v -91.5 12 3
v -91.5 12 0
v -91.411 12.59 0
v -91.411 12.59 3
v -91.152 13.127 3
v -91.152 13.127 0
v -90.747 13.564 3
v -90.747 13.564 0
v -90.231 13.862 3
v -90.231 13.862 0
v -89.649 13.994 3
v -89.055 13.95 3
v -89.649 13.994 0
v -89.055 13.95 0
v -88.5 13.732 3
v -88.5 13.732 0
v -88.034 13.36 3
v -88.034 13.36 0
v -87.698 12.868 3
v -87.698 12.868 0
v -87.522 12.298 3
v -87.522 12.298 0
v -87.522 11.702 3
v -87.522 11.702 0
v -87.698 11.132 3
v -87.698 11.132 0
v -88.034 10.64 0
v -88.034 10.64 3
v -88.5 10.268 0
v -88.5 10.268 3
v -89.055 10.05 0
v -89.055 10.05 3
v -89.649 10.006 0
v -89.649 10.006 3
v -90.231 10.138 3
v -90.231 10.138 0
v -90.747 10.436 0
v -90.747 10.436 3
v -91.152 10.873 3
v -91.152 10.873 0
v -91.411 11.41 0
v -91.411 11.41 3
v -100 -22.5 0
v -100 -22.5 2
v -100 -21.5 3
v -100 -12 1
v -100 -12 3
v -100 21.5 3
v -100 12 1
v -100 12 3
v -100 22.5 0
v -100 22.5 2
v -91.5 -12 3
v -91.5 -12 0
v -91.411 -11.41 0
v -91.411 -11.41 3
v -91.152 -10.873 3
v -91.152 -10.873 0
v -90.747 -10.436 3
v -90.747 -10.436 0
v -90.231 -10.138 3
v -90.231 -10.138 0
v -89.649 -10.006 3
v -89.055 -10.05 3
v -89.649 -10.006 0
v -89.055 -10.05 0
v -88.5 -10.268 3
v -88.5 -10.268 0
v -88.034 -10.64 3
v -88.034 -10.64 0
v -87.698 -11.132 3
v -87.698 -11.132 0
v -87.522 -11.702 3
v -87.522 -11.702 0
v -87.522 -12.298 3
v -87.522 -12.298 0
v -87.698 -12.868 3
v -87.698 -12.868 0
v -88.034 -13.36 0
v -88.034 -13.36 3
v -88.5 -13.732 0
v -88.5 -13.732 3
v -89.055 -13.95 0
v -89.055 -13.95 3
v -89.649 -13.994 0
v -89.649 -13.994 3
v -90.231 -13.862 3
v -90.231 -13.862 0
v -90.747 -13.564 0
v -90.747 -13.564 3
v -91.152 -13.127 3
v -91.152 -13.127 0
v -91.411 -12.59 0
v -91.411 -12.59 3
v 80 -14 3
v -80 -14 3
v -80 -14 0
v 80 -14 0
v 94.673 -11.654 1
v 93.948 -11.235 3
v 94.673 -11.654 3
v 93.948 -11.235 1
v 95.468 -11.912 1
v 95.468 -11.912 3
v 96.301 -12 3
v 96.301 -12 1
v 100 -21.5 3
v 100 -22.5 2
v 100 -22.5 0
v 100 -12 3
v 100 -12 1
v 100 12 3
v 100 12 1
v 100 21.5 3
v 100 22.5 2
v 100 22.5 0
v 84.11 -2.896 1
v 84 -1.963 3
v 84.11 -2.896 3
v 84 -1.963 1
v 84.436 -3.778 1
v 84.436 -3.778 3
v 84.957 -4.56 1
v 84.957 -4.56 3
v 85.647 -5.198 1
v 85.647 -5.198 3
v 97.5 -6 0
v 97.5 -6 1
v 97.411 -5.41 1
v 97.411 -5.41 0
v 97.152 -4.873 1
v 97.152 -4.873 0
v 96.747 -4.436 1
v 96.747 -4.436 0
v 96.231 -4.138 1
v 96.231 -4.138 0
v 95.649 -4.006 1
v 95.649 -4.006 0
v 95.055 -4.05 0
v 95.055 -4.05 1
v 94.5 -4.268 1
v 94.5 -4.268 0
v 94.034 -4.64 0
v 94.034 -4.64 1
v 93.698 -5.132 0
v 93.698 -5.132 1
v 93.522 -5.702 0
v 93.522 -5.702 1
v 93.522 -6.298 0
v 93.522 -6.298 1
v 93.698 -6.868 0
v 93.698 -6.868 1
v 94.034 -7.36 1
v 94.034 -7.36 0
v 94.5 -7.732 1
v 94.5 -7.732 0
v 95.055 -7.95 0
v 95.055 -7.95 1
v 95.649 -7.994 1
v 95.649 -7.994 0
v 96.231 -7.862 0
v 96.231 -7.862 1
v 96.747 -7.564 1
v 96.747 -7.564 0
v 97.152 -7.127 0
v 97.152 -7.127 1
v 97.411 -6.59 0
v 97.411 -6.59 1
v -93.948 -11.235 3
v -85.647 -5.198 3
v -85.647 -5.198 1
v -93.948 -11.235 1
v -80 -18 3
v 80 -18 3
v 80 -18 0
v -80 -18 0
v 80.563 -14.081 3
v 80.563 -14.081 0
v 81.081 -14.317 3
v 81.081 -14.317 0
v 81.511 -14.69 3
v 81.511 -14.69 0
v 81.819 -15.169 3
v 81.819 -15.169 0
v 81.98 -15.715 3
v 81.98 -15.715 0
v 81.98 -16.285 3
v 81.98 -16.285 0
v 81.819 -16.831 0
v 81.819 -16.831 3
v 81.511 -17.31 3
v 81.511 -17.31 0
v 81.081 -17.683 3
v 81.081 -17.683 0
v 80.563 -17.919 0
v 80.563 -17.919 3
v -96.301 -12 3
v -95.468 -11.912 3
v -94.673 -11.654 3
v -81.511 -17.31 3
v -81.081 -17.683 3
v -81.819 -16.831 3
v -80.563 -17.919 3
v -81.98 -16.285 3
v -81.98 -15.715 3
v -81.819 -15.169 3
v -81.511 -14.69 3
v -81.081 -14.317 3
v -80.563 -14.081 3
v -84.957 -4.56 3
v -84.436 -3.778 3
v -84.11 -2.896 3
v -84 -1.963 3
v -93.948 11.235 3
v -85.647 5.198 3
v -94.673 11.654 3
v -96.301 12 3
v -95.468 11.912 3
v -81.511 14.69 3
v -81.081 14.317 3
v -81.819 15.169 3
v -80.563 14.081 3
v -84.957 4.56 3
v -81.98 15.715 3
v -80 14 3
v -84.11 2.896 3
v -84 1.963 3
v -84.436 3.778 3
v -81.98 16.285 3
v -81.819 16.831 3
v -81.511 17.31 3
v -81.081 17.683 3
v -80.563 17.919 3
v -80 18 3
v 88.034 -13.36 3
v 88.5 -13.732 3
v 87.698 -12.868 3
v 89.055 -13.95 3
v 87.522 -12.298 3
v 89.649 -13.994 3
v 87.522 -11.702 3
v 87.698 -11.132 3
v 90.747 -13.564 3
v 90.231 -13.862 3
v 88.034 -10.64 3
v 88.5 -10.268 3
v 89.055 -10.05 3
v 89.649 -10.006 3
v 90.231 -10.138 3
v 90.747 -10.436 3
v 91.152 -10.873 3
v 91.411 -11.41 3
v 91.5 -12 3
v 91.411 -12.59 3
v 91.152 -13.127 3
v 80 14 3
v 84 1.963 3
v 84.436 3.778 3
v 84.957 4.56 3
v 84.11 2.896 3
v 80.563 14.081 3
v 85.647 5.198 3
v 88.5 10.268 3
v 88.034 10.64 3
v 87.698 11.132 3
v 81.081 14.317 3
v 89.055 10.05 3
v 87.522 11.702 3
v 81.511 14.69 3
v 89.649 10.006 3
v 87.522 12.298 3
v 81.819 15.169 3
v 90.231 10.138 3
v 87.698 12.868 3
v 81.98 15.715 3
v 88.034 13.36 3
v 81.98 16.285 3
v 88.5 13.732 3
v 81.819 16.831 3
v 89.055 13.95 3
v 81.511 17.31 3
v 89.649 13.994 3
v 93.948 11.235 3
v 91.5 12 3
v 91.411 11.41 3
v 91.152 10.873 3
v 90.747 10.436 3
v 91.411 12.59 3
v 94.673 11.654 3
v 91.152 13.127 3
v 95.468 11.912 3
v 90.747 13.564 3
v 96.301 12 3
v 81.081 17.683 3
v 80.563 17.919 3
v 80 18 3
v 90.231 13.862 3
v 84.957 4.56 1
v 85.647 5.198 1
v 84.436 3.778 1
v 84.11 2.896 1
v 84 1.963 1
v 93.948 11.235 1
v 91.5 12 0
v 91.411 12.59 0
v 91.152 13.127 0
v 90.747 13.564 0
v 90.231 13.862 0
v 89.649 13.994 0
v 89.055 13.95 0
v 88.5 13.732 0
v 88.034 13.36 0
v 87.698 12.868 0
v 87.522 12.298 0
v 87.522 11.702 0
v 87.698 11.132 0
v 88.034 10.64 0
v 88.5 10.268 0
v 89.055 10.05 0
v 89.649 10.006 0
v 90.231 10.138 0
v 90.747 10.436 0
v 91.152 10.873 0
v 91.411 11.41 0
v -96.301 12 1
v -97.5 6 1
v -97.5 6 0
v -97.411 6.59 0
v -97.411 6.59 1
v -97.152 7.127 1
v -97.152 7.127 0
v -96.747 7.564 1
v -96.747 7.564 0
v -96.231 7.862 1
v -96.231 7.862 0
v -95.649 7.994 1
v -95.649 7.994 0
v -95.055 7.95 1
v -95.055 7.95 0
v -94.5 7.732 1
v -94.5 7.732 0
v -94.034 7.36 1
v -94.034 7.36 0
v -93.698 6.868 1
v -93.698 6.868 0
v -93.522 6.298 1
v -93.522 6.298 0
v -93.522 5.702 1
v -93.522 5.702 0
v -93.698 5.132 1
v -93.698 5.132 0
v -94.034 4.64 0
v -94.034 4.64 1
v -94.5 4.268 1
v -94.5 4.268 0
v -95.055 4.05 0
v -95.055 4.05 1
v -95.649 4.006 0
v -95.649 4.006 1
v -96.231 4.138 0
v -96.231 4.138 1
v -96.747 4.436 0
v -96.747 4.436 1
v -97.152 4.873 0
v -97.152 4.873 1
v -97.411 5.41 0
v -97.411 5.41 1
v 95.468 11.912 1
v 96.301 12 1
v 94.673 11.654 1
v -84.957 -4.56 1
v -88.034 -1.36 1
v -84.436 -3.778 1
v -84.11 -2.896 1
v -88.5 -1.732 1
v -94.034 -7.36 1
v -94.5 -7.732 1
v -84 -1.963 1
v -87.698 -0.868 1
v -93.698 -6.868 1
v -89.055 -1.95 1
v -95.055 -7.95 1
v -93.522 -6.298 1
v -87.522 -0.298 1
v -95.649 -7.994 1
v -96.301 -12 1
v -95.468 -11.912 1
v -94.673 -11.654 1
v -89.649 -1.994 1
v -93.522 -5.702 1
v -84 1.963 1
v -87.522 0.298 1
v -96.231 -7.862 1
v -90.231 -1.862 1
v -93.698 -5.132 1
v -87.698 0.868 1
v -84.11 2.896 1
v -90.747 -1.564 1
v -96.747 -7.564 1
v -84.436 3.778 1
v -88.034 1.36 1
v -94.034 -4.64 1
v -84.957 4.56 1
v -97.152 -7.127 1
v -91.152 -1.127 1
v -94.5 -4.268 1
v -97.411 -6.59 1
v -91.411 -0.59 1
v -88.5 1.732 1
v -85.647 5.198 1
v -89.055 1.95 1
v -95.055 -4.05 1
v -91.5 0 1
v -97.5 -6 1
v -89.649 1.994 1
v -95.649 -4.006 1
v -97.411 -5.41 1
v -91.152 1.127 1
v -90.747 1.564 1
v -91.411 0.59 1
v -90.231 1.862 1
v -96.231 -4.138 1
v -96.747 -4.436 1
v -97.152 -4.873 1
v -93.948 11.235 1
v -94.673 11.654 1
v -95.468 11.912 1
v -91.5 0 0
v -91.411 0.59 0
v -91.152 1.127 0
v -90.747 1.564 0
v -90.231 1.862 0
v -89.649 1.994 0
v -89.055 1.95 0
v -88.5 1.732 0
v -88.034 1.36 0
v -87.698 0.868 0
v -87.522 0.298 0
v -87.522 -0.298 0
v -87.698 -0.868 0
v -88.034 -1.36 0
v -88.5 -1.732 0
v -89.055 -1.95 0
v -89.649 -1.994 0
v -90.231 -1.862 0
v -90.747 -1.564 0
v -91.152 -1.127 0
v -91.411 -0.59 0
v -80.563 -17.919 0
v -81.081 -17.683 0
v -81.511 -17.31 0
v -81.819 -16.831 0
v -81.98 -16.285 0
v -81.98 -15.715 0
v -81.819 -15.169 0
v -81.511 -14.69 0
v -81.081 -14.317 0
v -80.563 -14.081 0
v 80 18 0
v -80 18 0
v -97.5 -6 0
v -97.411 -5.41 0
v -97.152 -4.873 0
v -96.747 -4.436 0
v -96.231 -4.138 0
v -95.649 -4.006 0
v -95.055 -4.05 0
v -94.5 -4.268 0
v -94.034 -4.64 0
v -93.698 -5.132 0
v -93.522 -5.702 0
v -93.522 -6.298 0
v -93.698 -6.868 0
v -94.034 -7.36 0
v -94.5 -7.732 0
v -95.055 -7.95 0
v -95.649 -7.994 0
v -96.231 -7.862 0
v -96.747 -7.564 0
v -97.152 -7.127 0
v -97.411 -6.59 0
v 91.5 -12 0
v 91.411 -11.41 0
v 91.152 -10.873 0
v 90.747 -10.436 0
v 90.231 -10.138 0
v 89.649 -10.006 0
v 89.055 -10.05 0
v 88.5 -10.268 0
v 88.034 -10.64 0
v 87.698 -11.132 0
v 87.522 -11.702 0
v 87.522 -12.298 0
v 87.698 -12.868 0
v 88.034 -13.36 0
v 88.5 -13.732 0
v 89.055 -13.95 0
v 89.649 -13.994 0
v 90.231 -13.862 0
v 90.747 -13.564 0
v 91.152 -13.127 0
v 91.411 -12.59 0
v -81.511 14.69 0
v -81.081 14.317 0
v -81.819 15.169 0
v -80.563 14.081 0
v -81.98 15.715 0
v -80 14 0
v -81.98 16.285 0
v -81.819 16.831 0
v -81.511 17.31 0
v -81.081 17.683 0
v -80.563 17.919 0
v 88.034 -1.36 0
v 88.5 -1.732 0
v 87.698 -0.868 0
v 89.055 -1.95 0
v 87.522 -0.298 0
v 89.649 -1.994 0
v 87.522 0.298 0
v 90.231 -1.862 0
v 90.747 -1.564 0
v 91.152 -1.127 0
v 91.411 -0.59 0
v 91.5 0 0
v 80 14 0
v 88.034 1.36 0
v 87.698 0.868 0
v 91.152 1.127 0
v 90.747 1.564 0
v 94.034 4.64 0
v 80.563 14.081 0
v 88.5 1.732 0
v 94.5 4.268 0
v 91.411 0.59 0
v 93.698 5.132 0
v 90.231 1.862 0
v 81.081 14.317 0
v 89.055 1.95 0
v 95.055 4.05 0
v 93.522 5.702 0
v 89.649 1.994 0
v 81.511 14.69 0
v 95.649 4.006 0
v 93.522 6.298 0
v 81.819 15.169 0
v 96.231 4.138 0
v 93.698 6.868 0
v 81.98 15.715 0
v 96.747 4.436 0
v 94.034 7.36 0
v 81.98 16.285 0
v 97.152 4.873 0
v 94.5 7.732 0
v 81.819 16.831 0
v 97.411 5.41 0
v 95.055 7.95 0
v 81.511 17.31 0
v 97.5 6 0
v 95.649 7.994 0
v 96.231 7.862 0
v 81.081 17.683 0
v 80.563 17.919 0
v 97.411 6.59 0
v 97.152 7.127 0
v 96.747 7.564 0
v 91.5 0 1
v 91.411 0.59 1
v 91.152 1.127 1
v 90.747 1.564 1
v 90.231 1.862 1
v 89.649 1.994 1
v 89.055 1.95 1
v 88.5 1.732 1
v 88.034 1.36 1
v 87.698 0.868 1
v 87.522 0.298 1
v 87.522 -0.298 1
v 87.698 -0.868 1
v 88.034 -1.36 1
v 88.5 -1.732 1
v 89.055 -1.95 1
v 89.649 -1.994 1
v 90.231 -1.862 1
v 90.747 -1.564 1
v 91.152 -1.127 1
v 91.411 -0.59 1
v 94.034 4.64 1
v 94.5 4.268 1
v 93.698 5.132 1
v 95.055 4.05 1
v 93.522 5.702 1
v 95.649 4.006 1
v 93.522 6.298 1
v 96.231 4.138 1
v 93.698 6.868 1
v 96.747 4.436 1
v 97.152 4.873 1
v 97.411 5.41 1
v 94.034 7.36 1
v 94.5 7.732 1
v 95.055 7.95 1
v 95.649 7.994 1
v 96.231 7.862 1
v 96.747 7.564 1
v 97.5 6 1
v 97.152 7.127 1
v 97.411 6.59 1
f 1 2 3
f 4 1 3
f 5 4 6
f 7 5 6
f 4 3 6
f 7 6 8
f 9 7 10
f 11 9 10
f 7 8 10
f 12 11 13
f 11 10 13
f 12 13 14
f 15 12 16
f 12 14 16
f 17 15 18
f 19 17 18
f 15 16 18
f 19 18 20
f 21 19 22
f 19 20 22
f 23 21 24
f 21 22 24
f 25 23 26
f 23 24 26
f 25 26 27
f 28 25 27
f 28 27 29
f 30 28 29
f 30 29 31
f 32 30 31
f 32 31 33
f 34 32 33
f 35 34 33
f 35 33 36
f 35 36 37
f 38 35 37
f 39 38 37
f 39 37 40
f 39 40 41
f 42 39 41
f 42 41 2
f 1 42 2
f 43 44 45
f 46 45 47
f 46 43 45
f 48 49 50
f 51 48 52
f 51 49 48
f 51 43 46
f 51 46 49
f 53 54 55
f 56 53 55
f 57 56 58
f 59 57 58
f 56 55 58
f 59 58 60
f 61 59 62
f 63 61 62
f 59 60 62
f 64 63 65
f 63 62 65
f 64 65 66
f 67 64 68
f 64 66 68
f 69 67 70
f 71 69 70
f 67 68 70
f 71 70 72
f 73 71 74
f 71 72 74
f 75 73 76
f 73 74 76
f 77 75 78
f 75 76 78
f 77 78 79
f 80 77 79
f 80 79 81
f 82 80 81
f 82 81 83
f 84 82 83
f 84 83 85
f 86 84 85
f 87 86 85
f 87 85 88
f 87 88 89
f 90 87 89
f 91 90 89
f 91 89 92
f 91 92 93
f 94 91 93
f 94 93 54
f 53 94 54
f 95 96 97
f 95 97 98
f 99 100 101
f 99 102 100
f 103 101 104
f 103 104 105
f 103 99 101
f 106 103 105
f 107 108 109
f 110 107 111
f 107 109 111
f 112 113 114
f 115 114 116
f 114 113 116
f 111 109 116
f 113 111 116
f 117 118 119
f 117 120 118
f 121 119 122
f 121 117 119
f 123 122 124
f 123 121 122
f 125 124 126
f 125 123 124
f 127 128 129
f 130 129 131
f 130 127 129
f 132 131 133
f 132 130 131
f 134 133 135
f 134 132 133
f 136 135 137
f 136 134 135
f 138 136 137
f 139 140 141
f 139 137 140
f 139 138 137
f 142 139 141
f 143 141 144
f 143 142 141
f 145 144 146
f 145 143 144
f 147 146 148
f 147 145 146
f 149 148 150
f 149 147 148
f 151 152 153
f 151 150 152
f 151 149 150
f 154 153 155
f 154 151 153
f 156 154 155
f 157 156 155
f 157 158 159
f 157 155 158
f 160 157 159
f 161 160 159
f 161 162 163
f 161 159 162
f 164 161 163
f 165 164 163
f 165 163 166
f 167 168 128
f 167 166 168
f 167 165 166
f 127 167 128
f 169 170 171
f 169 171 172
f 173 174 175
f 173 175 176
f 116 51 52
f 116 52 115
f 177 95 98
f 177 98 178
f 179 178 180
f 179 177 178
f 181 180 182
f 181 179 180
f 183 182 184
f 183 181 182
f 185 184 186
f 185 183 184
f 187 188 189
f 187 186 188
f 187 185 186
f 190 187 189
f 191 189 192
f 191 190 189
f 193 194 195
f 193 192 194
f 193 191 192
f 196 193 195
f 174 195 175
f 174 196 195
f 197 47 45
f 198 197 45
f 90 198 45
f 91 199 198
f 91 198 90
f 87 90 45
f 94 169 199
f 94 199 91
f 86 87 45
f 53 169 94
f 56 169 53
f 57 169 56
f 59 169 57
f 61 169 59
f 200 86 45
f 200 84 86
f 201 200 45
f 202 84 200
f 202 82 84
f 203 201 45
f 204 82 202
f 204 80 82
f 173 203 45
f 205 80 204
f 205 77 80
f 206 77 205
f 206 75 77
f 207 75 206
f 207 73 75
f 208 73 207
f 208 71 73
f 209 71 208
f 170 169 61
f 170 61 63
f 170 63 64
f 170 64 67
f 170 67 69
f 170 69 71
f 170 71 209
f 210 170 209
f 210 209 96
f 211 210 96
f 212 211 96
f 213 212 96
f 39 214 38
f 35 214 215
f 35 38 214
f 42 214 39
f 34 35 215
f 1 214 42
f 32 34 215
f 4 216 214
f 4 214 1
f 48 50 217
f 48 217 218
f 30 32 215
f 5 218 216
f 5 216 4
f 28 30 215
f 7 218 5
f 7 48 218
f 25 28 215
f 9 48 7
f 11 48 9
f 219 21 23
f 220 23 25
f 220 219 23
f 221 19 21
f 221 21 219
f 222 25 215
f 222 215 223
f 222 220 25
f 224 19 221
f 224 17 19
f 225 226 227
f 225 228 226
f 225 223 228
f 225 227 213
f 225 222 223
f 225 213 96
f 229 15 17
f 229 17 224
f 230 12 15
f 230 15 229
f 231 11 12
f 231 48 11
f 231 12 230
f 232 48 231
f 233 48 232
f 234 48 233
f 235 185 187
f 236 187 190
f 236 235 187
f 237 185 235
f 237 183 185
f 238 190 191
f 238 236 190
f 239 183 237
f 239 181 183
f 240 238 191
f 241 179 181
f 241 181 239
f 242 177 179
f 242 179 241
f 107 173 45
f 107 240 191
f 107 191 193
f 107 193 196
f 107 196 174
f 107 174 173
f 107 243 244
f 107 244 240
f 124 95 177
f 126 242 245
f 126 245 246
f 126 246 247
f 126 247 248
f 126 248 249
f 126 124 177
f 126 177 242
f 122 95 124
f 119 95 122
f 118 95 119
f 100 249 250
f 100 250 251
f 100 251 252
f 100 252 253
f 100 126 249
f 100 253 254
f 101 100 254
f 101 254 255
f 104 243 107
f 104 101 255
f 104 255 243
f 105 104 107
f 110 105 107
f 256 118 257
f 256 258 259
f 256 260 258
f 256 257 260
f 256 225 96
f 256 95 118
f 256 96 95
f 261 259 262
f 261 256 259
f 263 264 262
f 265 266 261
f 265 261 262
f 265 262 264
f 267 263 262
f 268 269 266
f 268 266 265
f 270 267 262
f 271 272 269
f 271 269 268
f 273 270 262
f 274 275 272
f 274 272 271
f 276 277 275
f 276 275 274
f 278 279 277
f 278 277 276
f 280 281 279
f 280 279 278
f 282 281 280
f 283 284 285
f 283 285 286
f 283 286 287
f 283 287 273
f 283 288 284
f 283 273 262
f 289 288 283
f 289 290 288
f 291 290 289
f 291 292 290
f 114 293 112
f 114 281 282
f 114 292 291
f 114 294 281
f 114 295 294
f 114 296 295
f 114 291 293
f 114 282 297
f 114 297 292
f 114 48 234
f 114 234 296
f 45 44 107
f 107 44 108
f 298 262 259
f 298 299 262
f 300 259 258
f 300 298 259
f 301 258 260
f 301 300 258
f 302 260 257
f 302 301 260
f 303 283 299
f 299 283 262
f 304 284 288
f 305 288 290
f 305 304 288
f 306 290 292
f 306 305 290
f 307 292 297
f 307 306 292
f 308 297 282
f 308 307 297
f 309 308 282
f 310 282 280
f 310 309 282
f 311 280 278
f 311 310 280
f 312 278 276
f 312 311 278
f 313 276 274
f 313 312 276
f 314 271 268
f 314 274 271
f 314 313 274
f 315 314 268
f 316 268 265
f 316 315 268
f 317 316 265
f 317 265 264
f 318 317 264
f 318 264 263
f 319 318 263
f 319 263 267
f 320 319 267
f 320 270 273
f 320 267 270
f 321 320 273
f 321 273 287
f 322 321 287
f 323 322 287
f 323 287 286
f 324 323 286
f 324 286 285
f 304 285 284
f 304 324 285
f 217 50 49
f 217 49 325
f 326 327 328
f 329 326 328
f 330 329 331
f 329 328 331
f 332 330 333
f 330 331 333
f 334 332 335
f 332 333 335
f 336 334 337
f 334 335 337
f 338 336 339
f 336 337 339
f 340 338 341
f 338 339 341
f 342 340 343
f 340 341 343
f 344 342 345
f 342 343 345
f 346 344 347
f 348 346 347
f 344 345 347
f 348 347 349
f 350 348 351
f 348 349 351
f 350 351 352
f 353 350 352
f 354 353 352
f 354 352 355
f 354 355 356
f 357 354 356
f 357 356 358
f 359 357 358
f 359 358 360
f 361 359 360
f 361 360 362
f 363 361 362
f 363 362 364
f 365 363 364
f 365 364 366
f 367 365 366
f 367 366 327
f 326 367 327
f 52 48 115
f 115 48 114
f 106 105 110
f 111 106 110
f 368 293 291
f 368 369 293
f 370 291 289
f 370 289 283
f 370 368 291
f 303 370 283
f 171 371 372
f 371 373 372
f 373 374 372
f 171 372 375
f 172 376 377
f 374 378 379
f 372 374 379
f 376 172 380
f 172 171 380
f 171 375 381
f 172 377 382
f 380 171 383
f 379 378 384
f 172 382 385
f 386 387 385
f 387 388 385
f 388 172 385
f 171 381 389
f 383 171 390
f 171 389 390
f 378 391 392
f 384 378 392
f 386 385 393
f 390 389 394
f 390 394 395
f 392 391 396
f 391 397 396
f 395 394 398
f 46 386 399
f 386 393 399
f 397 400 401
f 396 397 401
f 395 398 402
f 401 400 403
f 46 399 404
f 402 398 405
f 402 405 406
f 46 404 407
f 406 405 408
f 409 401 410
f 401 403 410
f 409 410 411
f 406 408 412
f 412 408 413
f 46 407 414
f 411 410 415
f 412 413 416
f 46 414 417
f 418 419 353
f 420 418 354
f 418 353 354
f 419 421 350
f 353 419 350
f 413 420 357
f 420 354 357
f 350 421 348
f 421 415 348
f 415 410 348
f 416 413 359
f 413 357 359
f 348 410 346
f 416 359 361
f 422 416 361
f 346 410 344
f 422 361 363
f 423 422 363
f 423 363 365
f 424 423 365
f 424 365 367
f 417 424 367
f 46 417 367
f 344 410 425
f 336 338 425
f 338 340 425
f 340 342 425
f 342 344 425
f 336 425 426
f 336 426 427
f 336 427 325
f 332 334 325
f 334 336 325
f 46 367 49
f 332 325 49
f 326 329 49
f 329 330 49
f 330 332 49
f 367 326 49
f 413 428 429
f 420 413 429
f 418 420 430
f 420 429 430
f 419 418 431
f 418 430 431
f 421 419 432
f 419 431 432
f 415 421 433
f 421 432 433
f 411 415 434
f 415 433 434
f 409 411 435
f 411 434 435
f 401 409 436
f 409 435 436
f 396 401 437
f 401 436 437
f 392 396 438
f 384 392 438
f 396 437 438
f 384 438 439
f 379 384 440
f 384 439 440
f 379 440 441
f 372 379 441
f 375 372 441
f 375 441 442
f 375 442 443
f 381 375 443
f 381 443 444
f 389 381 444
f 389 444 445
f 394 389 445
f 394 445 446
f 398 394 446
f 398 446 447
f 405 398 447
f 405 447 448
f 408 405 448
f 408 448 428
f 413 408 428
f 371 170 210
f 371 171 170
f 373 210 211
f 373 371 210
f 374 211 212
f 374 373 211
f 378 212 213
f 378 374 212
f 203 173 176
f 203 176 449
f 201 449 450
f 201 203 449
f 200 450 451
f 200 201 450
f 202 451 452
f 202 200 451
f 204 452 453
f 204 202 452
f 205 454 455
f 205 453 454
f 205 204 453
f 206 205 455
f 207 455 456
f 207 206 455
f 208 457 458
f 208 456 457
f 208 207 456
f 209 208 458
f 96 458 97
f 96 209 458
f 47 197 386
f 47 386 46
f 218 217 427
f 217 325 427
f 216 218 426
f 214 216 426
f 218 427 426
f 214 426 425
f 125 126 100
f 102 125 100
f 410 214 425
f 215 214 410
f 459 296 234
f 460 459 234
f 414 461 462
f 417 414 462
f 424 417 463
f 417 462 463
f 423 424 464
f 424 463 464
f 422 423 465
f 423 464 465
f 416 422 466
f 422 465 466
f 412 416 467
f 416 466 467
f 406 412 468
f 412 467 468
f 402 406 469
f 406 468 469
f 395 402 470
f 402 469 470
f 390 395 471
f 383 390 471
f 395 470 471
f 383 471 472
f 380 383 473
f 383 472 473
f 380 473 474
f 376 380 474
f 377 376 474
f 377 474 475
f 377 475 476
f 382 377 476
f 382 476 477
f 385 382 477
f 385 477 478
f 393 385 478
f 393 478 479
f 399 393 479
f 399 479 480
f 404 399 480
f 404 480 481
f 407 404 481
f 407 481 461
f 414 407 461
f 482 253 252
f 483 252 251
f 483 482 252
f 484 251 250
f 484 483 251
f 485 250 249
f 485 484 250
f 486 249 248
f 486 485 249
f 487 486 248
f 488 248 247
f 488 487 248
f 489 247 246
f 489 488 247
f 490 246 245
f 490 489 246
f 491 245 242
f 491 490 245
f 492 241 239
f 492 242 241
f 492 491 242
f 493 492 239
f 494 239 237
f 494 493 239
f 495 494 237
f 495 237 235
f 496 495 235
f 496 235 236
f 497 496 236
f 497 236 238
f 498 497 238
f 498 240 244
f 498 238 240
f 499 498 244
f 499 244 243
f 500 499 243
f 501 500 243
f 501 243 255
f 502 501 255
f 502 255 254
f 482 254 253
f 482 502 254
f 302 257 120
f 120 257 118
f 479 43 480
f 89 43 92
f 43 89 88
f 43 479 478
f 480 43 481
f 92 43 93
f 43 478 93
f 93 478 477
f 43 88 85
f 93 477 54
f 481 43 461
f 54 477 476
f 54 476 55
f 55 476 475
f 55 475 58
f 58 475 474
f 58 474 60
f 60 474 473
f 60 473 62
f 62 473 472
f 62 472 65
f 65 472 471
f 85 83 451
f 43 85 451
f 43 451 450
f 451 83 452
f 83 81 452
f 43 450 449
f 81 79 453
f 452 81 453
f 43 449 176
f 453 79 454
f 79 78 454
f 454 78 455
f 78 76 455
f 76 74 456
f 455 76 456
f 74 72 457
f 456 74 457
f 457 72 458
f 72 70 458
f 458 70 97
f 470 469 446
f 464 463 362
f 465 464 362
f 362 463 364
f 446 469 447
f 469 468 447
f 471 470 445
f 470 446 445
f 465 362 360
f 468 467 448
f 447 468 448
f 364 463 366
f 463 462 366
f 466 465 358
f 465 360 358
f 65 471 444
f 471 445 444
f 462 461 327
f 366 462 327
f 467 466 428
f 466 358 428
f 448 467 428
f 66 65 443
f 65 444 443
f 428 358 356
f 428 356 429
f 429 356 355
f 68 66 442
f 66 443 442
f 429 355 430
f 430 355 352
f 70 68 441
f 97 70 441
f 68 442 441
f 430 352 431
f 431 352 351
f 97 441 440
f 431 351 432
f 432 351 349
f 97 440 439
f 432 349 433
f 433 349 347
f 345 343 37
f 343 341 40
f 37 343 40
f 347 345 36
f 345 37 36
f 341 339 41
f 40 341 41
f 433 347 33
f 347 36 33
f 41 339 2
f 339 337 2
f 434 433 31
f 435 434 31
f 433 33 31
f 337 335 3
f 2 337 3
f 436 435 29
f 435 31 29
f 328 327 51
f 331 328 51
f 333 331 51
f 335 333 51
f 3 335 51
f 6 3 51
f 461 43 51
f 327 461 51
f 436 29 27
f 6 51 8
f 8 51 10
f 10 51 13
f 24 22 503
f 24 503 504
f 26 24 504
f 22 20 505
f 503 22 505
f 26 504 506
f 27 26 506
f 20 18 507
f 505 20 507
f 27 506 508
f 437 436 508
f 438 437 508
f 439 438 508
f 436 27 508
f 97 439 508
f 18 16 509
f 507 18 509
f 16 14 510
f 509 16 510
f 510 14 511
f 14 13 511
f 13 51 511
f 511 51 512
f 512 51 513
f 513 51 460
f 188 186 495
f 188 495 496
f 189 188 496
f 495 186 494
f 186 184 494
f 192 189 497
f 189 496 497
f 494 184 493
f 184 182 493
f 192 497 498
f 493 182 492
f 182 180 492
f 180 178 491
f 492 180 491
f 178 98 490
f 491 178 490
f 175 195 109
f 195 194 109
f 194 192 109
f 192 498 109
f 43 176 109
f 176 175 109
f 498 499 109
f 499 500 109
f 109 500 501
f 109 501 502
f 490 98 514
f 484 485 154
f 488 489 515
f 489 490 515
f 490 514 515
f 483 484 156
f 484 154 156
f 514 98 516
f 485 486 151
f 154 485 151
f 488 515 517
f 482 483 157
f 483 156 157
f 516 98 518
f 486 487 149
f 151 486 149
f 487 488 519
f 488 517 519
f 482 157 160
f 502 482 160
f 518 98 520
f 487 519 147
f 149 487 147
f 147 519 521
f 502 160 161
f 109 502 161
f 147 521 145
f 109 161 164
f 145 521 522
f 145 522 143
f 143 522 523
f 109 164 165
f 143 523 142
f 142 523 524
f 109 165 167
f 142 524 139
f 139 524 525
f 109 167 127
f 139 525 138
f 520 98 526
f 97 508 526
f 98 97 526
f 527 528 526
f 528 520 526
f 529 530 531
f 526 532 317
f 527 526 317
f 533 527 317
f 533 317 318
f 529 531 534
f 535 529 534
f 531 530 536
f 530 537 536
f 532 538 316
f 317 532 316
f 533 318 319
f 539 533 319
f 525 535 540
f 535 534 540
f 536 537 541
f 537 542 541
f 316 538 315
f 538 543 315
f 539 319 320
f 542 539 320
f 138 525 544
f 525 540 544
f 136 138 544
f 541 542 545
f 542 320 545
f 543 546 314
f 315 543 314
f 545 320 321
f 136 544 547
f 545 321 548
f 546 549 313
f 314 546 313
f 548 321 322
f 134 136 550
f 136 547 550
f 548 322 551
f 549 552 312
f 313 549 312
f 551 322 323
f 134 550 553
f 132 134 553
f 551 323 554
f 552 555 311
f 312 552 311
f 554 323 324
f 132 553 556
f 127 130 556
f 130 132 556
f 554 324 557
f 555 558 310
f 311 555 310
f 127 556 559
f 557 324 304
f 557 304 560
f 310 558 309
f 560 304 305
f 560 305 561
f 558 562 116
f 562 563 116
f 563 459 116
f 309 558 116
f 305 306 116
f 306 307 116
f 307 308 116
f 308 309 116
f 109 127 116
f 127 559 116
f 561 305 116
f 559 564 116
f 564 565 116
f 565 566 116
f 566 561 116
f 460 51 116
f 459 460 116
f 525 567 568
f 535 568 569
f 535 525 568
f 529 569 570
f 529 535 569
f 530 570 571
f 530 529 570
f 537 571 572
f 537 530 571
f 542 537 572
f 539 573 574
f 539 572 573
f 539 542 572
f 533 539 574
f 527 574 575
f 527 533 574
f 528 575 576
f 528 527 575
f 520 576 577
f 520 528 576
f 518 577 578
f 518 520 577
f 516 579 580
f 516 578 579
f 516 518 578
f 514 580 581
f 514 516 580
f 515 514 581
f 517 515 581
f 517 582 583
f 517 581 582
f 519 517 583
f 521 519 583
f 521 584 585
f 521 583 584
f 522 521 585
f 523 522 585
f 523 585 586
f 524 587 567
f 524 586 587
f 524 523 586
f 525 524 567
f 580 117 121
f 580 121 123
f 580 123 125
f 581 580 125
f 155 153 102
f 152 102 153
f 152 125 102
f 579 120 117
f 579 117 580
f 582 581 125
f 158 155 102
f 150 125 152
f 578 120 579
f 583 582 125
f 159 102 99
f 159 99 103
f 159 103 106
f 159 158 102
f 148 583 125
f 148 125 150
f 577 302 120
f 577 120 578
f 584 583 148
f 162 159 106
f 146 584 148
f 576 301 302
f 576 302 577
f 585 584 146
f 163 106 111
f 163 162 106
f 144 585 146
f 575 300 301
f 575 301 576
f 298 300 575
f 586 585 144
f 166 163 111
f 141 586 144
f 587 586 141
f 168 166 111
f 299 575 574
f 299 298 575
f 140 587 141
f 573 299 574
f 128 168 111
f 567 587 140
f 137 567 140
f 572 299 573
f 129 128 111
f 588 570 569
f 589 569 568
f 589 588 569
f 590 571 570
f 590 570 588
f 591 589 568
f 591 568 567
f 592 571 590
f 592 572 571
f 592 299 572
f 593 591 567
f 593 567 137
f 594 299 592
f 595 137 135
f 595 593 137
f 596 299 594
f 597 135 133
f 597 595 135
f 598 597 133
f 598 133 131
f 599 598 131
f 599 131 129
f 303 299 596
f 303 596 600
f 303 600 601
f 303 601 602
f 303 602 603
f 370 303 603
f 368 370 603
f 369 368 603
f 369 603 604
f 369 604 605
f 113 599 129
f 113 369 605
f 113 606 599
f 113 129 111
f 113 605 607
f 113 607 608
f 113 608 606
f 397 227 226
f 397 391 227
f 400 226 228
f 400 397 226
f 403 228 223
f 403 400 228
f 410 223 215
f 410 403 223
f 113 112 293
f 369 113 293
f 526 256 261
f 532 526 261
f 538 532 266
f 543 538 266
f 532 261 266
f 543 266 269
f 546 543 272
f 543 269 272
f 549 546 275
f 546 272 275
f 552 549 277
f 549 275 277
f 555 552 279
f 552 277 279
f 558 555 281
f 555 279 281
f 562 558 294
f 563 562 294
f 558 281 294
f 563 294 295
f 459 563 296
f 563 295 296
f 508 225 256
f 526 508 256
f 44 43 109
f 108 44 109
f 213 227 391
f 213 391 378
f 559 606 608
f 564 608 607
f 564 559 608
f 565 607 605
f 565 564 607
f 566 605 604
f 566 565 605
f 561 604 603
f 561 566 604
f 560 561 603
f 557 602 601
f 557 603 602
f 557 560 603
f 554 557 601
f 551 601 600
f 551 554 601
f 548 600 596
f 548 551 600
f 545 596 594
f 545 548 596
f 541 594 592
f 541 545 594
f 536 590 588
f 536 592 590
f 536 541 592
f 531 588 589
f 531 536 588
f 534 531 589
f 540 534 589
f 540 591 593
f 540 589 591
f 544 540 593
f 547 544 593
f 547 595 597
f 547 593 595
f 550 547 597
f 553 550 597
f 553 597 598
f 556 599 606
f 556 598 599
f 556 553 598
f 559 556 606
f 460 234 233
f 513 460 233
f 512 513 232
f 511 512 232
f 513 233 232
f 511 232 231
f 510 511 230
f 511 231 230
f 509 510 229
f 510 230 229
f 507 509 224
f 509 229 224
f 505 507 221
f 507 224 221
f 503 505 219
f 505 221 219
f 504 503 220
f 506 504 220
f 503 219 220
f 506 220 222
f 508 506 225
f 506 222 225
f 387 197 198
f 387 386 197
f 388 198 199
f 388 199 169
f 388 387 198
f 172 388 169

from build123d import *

# Parameters (mm, degrees)
SKETCH1_W            = 200
SKETCH1_H            = 45
BOSS_EXTRUDE1_DEPTH  = 3
SKETCH2_R            = 2
CUT_EXTRUDE1_DEPTH   = 5
CUT_EXTRUDE5_DEPTH   = 2
CHAMFER2_SIZE        = 1
FILLET1_R            = 4
FILLET1_OF_MIRROR4_R = 4
CUT_EXTRUDE6_DEPTH   = 10


with BuildPart() as part:
    # Sketch1 → Boss-Extrude1 (new body)
    with BuildSketch(Plane.XY):
        Rectangle(SKETCH1_W, SKETCH1_H)
    extrude(amount=BOSS_EXTRUDE1_DEPTH)

    # Sketch2 → Cut-Extrude1 (cut)
    with BuildSketch(Plane(origin=(0, 0, 0), x_dir=(-1, 0, 0), z_dir=(0, 0, -1))):
        with Locations((89.5, 0)):
            Circle(SKETCH2_R)
        with Locations((95.5, 6)):
            Circle(SKETCH2_R)
        with Locations((95.5, -6)):
            Circle(SKETCH2_R)
        with Locations((89.5, -12)):
            Circle(SKETCH2_R)
        with Locations((89.5, 12)):
            Circle(SKETCH2_R)
    cut_extrude1 = extrude(amount=-CUT_EXTRUDE1_DEPTH, mode=Mode.SUBTRACT)

    # Sketch8 → Cut-Extrude5 (cut)
    with BuildSketch(Plane.XY.offset(3)):
        Polygon((-84, 4), (-84, -4), (-95, -12), (-100, -12), (-100, 12), (-95, 12), align=None)
    cut_extrude5 = extrude(amount=-CUT_EXTRUDE5_DEPTH, mode=Mode.SUBTRACT)

    # Chamfer2
    chamfer2_edges = [part.edges().sort_by_distance(p)[0] for p in [
        (0, -22.5, 3),
        (0, 22.5, 3),
    ]]
    chamfer(chamfer2_edges, length=CHAMFER2_SIZE)

    # Fillet1
    fillet1_edges = [part.edges().sort_by_distance(p)[0] for p in [
        (-95, 12, 2),
        (-84, 4, 2),
        (-84, -4, 2),
        (-95, -12, 2),
    ]]
    fillet(fillet1_edges, radius=FILLET1_R)

    # Mirror4: Cut-Extrude1, Cut-Extrude5 across plane
    add(cut_extrude1.mirror(Plane(origin=(0, 0, 0), x_dir=(0, 0, 1), z_dir=(1, 0, 0))), mode=Mode.SUBTRACT)
    add(cut_extrude5.mirror(Plane(origin=(0, 0, 0), x_dir=(0, 0, 1), z_dir=(1, 0, 0))), mode=Mode.SUBTRACT)

    # Fillet1 of Mirror4
    fillet1_of_mirror4_edges = [part.edges().sort_by_distance(p)[0] for p in [
        (95, 12, 2),
        (84, 4, 2),
        (84, -4, 2),
        (95, -12, 2),
    ]]
    fillet(fillet1_of_mirror4_edges, radius=FILLET1_OF_MIRROR4_R)

    # Sketch9 → Cut-Extrude6 (cut)
    with BuildSketch(Plane.XY.offset(3)):
        with BuildLine():
            Line((80, -18), (-80, -18))
            ThreePointArc((-80, -18), (-82, -16), (-80, -14))
            Line((-80, -14), (80, -14))
            ThreePointArc((80, -14), (82, -16), (80, -18))
        make_face()
    cut_extrude6 = extrude(amount=-CUT_EXTRUDE6_DEPTH, mode=Mode.SUBTRACT)

    # Mirror5: Cut-Extrude6 across plane
    add(cut_extrude6.mirror(Plane.ZX), mode=Mode.SUBTRACT)


solid = part.part
